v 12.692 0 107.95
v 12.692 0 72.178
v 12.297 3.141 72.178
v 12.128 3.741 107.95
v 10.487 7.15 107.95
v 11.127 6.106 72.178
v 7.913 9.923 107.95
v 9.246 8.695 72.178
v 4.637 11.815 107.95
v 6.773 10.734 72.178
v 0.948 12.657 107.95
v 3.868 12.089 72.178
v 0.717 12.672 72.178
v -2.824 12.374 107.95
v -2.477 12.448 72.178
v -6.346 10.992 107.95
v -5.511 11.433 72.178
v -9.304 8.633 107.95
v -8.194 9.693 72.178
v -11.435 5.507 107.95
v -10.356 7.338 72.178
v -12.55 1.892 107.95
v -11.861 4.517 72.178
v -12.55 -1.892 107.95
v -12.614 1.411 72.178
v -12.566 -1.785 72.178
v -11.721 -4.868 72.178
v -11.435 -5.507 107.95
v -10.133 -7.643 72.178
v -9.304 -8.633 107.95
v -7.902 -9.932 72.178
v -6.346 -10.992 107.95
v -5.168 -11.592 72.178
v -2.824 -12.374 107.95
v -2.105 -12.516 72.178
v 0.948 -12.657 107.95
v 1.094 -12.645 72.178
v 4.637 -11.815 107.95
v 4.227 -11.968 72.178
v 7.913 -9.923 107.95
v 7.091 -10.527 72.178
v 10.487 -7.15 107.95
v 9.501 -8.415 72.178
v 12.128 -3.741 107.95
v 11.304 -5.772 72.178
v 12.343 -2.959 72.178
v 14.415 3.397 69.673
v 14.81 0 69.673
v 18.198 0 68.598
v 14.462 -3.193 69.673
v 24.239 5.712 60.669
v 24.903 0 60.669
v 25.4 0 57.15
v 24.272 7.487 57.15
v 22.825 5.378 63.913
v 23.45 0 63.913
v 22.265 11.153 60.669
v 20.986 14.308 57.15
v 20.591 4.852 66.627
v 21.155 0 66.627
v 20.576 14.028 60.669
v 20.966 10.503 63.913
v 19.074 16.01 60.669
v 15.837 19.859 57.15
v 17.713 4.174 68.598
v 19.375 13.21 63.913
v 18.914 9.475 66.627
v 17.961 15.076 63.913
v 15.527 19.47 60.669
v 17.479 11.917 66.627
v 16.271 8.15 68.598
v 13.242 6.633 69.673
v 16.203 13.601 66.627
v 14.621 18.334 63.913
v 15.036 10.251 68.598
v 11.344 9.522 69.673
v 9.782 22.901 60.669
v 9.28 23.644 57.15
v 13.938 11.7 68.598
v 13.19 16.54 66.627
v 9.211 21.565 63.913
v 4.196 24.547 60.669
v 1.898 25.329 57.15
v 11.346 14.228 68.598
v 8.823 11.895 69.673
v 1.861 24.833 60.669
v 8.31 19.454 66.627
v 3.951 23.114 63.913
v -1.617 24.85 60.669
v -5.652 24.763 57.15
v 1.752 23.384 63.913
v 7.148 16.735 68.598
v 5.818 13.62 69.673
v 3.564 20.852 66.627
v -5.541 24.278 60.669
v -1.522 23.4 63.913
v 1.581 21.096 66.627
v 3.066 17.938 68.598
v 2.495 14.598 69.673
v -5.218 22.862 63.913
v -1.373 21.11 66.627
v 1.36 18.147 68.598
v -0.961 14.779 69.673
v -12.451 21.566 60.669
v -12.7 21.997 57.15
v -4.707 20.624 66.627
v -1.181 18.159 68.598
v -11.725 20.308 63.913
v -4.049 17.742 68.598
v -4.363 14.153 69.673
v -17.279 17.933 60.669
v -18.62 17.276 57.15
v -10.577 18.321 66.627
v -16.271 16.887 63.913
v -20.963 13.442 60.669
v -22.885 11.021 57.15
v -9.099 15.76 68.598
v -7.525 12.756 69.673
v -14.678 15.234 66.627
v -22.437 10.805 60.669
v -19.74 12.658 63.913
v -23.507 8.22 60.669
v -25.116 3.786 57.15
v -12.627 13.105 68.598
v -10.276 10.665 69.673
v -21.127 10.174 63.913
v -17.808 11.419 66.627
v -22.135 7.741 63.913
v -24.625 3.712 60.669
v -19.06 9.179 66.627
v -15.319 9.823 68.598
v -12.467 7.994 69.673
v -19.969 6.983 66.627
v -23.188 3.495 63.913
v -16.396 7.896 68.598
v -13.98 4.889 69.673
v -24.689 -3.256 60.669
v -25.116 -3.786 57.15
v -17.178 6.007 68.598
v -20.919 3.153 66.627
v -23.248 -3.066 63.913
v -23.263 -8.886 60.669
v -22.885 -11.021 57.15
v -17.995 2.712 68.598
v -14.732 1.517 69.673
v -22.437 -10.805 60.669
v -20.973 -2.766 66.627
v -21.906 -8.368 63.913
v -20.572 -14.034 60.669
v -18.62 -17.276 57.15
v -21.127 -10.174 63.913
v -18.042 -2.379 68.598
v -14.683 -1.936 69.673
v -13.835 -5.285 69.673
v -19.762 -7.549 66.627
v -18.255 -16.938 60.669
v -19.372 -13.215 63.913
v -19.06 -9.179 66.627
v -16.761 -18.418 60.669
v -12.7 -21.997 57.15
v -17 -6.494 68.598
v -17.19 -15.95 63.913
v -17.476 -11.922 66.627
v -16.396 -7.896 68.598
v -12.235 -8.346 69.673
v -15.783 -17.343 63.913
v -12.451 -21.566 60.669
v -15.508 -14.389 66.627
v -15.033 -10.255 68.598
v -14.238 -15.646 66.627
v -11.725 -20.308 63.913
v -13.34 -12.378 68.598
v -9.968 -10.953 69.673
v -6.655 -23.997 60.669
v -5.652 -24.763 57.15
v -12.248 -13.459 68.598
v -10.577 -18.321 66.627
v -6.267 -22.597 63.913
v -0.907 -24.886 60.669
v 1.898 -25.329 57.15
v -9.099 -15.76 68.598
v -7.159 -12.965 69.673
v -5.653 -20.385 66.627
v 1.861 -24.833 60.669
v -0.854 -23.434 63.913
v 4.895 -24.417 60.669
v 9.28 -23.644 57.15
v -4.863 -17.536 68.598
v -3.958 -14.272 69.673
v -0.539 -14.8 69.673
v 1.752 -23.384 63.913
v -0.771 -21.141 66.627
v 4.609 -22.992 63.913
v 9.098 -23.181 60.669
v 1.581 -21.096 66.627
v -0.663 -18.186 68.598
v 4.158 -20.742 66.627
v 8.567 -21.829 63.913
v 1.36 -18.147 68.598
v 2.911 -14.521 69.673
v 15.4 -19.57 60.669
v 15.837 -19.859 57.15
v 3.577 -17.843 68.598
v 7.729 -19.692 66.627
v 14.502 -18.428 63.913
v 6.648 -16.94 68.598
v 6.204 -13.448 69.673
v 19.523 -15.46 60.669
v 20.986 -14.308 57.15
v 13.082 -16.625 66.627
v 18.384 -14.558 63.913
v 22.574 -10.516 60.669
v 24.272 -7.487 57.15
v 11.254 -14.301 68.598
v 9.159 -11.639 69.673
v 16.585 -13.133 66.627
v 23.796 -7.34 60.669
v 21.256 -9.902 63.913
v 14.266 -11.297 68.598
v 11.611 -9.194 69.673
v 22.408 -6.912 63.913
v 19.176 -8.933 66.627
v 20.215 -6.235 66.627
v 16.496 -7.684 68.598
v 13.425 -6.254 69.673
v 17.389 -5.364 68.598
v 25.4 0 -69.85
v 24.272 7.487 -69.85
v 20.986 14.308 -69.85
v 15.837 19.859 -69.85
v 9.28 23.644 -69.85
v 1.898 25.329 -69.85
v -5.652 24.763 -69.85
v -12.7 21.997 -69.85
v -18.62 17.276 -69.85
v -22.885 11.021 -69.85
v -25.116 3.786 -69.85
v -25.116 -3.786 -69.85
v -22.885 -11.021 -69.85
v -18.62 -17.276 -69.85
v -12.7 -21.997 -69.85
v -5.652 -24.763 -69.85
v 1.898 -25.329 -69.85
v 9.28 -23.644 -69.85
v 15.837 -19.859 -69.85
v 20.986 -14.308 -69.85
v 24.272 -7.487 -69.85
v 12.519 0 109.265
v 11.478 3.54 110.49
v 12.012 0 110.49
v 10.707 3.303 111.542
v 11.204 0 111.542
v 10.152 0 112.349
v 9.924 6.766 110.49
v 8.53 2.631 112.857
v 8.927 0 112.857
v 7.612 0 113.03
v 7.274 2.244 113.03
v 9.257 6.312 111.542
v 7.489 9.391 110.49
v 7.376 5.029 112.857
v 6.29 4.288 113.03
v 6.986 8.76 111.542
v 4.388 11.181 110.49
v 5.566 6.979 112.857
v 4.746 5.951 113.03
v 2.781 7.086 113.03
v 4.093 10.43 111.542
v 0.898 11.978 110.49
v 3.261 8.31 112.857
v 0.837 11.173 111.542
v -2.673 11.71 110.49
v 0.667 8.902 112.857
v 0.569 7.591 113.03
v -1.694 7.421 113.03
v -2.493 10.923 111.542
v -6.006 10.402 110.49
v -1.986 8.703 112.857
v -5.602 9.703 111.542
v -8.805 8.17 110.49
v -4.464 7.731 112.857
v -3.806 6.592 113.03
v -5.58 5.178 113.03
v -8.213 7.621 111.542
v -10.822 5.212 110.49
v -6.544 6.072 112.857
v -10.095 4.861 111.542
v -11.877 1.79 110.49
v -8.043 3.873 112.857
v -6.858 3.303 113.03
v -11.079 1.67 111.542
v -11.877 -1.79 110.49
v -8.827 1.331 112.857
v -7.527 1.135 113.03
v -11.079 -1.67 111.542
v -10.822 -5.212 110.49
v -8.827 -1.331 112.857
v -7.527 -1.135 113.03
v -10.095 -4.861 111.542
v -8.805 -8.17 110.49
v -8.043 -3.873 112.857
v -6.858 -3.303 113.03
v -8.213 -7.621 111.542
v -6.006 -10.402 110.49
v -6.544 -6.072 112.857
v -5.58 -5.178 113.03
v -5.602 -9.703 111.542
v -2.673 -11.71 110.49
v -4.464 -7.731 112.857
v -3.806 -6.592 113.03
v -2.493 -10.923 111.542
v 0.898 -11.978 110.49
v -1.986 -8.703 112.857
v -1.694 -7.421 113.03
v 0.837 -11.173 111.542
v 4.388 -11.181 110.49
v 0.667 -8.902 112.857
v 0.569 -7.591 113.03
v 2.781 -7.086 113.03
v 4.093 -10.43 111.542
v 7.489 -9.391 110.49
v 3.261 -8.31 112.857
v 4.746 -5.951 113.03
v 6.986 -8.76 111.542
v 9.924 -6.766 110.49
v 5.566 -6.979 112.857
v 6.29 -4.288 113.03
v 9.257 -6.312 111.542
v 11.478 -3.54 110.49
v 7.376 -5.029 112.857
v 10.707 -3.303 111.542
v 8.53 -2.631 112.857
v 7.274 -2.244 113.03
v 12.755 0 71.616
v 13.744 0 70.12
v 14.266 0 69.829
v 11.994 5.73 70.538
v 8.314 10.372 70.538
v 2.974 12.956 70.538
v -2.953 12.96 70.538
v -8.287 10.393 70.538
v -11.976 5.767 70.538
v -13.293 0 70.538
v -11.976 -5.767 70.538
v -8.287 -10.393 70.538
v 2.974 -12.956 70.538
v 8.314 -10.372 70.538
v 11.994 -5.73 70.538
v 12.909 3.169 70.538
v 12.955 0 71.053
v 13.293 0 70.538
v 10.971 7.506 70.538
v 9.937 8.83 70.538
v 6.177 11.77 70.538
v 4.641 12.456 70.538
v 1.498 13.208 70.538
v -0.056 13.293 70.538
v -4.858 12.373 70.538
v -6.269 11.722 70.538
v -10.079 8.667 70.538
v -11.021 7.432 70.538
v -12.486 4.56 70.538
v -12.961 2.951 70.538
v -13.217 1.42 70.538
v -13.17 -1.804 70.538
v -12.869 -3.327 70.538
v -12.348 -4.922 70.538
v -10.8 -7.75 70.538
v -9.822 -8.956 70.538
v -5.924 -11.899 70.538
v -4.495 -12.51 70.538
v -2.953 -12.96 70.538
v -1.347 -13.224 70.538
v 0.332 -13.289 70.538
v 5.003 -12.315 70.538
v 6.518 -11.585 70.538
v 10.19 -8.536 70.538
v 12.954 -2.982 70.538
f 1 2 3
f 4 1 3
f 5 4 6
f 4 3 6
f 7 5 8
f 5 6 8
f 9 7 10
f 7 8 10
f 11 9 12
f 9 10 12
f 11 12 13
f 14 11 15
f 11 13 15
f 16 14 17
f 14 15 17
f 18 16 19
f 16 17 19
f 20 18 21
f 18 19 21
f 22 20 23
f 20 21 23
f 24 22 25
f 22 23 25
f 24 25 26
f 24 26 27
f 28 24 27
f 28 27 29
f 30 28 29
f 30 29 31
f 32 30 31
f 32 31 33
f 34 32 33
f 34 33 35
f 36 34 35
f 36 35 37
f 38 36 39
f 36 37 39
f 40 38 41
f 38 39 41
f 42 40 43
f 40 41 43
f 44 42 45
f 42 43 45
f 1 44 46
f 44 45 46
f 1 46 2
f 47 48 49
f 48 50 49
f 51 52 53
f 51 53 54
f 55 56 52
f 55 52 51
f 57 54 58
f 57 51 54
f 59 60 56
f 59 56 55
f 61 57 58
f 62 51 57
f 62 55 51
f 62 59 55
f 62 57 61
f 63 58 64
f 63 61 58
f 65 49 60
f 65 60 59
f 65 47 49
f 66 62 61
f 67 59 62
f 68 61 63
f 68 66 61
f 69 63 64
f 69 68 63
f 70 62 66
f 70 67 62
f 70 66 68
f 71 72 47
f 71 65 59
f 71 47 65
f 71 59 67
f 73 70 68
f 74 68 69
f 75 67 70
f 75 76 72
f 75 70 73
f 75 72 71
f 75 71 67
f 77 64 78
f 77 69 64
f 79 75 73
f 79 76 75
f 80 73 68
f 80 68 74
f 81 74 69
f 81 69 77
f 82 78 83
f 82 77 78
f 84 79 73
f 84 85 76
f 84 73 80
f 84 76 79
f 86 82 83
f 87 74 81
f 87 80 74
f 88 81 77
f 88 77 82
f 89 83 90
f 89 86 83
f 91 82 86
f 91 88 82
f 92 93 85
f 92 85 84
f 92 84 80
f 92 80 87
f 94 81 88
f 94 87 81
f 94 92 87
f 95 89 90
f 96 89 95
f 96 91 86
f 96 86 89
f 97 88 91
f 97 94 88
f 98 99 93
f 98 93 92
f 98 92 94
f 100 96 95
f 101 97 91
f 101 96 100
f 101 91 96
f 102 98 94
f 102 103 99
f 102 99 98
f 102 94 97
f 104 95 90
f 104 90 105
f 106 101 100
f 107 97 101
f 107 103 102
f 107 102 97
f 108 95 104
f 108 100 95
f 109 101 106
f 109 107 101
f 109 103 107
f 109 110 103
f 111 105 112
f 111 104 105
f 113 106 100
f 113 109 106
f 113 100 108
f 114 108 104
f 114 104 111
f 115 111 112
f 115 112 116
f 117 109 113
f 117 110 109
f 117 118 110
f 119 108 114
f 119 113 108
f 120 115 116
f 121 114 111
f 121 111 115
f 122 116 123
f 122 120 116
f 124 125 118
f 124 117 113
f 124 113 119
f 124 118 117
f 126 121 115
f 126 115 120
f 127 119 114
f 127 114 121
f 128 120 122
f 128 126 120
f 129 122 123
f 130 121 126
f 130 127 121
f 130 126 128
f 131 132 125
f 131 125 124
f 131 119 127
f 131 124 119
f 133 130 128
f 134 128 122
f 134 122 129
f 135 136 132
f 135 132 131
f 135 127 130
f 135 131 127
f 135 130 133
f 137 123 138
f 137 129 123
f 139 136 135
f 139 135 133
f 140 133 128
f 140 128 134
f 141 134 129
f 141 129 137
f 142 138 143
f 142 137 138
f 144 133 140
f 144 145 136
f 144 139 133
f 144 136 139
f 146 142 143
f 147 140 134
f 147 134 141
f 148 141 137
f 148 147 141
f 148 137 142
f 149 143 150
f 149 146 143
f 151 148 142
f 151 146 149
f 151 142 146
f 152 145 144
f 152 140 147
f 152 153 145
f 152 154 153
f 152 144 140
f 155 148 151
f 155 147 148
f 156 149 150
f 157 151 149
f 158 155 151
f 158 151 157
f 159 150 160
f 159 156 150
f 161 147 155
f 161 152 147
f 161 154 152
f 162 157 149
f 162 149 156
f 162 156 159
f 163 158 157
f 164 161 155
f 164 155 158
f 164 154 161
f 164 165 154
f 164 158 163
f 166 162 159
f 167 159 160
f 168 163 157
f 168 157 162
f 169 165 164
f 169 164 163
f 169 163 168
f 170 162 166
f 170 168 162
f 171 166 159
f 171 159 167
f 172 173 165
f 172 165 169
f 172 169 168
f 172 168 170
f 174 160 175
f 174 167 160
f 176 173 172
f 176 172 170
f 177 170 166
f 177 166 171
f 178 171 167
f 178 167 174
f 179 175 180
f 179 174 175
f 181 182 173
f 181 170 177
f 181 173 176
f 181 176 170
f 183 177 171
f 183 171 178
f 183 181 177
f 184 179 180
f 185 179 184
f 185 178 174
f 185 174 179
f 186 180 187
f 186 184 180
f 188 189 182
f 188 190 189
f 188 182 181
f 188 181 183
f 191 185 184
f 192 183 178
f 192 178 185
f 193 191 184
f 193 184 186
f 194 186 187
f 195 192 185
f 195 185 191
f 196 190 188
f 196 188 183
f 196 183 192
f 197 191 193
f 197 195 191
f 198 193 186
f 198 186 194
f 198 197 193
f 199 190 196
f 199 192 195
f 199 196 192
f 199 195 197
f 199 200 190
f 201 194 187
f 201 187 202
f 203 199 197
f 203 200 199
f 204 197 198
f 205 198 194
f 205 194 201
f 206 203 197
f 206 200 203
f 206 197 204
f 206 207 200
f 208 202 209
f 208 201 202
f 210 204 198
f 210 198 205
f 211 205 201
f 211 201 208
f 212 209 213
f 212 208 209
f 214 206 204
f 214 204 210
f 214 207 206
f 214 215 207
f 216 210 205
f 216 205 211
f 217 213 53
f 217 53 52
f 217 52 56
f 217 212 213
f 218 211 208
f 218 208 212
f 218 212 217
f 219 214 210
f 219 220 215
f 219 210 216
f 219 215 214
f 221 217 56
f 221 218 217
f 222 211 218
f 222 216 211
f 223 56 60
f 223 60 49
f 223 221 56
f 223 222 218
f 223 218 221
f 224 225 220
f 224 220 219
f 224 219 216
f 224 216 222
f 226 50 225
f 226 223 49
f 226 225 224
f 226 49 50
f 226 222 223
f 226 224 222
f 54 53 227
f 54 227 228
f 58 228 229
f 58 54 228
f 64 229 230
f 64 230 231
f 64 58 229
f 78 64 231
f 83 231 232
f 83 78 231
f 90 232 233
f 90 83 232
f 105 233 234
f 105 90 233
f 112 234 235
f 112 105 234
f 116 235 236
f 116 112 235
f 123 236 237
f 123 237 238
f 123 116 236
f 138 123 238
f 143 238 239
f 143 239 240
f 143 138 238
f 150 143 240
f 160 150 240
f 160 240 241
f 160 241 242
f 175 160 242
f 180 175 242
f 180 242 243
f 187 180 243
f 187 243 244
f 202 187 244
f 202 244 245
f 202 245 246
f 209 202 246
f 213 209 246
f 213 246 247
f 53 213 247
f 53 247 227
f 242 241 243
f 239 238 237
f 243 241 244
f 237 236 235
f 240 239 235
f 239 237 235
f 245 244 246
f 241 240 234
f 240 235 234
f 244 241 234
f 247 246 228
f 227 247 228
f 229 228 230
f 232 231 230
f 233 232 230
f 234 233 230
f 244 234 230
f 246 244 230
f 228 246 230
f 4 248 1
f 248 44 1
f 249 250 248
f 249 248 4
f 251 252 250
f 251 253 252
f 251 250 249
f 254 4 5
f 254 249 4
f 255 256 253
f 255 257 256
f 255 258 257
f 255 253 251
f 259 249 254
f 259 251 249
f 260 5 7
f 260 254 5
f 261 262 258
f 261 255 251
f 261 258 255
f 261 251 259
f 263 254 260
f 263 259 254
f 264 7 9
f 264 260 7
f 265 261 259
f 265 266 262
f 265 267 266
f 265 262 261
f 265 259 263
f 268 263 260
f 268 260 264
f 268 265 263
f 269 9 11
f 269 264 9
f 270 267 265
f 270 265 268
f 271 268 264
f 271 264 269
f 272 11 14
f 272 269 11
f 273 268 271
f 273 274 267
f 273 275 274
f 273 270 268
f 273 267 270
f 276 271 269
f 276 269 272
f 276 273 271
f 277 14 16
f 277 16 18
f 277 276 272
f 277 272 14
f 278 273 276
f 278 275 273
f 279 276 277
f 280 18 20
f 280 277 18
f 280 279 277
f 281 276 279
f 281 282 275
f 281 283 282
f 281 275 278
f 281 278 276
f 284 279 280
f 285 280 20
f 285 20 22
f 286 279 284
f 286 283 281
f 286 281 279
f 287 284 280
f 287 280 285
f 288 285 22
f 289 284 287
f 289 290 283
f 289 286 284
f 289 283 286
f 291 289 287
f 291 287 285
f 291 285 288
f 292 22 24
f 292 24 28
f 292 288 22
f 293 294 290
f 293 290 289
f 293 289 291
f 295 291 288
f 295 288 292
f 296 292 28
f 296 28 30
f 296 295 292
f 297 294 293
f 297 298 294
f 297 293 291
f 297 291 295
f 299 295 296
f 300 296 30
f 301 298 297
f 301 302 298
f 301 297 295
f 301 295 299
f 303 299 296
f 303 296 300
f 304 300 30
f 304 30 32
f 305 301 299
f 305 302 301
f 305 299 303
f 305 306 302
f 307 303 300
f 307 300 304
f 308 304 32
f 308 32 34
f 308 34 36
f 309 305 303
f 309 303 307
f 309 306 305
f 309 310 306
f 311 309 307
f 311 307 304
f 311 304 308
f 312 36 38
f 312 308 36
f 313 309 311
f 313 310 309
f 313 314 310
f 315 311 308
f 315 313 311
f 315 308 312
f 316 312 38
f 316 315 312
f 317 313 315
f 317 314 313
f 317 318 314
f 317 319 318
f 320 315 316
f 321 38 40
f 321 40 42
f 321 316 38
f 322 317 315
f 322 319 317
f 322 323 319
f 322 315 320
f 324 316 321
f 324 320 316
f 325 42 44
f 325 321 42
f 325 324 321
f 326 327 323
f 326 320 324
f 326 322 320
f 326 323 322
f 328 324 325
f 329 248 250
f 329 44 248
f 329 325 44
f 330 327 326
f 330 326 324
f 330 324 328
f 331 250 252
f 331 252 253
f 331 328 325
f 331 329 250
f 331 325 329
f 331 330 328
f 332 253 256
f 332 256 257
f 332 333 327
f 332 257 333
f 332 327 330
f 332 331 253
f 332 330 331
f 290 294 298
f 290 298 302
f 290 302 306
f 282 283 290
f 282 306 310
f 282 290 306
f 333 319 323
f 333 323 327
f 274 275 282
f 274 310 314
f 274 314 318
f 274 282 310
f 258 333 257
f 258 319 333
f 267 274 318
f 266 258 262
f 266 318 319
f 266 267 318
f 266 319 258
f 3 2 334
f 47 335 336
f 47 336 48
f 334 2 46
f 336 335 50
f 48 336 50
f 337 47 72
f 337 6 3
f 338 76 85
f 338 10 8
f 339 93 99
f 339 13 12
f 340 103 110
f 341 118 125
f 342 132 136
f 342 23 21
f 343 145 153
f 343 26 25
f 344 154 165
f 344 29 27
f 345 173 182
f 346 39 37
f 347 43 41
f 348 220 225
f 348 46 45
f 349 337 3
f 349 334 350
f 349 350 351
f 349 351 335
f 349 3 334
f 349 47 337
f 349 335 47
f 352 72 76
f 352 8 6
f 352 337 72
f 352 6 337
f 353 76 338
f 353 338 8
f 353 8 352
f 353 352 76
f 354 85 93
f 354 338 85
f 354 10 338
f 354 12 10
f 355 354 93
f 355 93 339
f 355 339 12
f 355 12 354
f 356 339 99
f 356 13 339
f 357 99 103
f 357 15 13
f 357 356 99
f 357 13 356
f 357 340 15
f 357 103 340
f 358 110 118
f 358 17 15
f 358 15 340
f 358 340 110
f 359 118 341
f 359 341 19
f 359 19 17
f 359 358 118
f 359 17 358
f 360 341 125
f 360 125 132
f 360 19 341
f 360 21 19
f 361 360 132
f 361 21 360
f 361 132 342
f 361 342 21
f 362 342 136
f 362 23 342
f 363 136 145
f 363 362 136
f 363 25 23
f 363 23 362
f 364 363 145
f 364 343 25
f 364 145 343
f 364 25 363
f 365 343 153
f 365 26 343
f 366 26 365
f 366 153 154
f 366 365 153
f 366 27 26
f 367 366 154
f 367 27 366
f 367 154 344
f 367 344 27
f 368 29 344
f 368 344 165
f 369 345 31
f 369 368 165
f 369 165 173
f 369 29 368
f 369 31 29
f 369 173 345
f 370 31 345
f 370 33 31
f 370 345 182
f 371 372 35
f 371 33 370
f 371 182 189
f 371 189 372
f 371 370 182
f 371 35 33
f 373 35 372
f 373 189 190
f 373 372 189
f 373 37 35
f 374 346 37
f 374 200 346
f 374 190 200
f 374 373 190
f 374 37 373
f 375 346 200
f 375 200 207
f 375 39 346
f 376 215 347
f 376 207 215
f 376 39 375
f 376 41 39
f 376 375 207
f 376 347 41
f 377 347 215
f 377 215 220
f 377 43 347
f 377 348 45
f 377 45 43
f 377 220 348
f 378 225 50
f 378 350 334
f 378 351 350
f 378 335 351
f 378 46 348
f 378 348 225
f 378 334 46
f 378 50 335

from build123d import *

# Parameters (mm, degrees)
F0_R     = 25.4
F1_DEPTH = 69.85
F2_R     = 12.7
F3_R     = 12.6922098365
F4_DEPTH = 43.18
F5_R     = 5.08
F6_R     = 2.54


with BuildPart() as f1:
    # F0 (on Top) → F1 (new body, symmetric)
    with BuildSketch(Plane.XY):
        Circle(F0_R)
    extrude(amount=F1_DEPTH, both=True)

    # F2
    f2_edges = [f1.edges().sort_by_distance(p)[0] for p in [
        (-25.4, 0, 69.85),
    ]]
    fillet(f2_edges, radius=F2_R)

    # F3 (on face) → F4 (join)
    with BuildSketch(Plane.XY.offset(69.85)):
        Circle(F3_R)
    extrude(amount=F4_DEPTH)

    # F5
    f5_edges = [f1.edges().sort_by_distance(p)[0] for p in [
        (-12.69221, 0, 113.03),
    ]]
    fillet(f5_edges, radius=F5_R)

    # F6
    f6_edges = [f1.edges().sort_by_distance(p)[0] for p in [
        (-12.7, 0, 69.85),
        (-12.69221, 0, 69.85),
    ]]
    fillet(f6_edges, radius=F6_R)


solid = f1.part
